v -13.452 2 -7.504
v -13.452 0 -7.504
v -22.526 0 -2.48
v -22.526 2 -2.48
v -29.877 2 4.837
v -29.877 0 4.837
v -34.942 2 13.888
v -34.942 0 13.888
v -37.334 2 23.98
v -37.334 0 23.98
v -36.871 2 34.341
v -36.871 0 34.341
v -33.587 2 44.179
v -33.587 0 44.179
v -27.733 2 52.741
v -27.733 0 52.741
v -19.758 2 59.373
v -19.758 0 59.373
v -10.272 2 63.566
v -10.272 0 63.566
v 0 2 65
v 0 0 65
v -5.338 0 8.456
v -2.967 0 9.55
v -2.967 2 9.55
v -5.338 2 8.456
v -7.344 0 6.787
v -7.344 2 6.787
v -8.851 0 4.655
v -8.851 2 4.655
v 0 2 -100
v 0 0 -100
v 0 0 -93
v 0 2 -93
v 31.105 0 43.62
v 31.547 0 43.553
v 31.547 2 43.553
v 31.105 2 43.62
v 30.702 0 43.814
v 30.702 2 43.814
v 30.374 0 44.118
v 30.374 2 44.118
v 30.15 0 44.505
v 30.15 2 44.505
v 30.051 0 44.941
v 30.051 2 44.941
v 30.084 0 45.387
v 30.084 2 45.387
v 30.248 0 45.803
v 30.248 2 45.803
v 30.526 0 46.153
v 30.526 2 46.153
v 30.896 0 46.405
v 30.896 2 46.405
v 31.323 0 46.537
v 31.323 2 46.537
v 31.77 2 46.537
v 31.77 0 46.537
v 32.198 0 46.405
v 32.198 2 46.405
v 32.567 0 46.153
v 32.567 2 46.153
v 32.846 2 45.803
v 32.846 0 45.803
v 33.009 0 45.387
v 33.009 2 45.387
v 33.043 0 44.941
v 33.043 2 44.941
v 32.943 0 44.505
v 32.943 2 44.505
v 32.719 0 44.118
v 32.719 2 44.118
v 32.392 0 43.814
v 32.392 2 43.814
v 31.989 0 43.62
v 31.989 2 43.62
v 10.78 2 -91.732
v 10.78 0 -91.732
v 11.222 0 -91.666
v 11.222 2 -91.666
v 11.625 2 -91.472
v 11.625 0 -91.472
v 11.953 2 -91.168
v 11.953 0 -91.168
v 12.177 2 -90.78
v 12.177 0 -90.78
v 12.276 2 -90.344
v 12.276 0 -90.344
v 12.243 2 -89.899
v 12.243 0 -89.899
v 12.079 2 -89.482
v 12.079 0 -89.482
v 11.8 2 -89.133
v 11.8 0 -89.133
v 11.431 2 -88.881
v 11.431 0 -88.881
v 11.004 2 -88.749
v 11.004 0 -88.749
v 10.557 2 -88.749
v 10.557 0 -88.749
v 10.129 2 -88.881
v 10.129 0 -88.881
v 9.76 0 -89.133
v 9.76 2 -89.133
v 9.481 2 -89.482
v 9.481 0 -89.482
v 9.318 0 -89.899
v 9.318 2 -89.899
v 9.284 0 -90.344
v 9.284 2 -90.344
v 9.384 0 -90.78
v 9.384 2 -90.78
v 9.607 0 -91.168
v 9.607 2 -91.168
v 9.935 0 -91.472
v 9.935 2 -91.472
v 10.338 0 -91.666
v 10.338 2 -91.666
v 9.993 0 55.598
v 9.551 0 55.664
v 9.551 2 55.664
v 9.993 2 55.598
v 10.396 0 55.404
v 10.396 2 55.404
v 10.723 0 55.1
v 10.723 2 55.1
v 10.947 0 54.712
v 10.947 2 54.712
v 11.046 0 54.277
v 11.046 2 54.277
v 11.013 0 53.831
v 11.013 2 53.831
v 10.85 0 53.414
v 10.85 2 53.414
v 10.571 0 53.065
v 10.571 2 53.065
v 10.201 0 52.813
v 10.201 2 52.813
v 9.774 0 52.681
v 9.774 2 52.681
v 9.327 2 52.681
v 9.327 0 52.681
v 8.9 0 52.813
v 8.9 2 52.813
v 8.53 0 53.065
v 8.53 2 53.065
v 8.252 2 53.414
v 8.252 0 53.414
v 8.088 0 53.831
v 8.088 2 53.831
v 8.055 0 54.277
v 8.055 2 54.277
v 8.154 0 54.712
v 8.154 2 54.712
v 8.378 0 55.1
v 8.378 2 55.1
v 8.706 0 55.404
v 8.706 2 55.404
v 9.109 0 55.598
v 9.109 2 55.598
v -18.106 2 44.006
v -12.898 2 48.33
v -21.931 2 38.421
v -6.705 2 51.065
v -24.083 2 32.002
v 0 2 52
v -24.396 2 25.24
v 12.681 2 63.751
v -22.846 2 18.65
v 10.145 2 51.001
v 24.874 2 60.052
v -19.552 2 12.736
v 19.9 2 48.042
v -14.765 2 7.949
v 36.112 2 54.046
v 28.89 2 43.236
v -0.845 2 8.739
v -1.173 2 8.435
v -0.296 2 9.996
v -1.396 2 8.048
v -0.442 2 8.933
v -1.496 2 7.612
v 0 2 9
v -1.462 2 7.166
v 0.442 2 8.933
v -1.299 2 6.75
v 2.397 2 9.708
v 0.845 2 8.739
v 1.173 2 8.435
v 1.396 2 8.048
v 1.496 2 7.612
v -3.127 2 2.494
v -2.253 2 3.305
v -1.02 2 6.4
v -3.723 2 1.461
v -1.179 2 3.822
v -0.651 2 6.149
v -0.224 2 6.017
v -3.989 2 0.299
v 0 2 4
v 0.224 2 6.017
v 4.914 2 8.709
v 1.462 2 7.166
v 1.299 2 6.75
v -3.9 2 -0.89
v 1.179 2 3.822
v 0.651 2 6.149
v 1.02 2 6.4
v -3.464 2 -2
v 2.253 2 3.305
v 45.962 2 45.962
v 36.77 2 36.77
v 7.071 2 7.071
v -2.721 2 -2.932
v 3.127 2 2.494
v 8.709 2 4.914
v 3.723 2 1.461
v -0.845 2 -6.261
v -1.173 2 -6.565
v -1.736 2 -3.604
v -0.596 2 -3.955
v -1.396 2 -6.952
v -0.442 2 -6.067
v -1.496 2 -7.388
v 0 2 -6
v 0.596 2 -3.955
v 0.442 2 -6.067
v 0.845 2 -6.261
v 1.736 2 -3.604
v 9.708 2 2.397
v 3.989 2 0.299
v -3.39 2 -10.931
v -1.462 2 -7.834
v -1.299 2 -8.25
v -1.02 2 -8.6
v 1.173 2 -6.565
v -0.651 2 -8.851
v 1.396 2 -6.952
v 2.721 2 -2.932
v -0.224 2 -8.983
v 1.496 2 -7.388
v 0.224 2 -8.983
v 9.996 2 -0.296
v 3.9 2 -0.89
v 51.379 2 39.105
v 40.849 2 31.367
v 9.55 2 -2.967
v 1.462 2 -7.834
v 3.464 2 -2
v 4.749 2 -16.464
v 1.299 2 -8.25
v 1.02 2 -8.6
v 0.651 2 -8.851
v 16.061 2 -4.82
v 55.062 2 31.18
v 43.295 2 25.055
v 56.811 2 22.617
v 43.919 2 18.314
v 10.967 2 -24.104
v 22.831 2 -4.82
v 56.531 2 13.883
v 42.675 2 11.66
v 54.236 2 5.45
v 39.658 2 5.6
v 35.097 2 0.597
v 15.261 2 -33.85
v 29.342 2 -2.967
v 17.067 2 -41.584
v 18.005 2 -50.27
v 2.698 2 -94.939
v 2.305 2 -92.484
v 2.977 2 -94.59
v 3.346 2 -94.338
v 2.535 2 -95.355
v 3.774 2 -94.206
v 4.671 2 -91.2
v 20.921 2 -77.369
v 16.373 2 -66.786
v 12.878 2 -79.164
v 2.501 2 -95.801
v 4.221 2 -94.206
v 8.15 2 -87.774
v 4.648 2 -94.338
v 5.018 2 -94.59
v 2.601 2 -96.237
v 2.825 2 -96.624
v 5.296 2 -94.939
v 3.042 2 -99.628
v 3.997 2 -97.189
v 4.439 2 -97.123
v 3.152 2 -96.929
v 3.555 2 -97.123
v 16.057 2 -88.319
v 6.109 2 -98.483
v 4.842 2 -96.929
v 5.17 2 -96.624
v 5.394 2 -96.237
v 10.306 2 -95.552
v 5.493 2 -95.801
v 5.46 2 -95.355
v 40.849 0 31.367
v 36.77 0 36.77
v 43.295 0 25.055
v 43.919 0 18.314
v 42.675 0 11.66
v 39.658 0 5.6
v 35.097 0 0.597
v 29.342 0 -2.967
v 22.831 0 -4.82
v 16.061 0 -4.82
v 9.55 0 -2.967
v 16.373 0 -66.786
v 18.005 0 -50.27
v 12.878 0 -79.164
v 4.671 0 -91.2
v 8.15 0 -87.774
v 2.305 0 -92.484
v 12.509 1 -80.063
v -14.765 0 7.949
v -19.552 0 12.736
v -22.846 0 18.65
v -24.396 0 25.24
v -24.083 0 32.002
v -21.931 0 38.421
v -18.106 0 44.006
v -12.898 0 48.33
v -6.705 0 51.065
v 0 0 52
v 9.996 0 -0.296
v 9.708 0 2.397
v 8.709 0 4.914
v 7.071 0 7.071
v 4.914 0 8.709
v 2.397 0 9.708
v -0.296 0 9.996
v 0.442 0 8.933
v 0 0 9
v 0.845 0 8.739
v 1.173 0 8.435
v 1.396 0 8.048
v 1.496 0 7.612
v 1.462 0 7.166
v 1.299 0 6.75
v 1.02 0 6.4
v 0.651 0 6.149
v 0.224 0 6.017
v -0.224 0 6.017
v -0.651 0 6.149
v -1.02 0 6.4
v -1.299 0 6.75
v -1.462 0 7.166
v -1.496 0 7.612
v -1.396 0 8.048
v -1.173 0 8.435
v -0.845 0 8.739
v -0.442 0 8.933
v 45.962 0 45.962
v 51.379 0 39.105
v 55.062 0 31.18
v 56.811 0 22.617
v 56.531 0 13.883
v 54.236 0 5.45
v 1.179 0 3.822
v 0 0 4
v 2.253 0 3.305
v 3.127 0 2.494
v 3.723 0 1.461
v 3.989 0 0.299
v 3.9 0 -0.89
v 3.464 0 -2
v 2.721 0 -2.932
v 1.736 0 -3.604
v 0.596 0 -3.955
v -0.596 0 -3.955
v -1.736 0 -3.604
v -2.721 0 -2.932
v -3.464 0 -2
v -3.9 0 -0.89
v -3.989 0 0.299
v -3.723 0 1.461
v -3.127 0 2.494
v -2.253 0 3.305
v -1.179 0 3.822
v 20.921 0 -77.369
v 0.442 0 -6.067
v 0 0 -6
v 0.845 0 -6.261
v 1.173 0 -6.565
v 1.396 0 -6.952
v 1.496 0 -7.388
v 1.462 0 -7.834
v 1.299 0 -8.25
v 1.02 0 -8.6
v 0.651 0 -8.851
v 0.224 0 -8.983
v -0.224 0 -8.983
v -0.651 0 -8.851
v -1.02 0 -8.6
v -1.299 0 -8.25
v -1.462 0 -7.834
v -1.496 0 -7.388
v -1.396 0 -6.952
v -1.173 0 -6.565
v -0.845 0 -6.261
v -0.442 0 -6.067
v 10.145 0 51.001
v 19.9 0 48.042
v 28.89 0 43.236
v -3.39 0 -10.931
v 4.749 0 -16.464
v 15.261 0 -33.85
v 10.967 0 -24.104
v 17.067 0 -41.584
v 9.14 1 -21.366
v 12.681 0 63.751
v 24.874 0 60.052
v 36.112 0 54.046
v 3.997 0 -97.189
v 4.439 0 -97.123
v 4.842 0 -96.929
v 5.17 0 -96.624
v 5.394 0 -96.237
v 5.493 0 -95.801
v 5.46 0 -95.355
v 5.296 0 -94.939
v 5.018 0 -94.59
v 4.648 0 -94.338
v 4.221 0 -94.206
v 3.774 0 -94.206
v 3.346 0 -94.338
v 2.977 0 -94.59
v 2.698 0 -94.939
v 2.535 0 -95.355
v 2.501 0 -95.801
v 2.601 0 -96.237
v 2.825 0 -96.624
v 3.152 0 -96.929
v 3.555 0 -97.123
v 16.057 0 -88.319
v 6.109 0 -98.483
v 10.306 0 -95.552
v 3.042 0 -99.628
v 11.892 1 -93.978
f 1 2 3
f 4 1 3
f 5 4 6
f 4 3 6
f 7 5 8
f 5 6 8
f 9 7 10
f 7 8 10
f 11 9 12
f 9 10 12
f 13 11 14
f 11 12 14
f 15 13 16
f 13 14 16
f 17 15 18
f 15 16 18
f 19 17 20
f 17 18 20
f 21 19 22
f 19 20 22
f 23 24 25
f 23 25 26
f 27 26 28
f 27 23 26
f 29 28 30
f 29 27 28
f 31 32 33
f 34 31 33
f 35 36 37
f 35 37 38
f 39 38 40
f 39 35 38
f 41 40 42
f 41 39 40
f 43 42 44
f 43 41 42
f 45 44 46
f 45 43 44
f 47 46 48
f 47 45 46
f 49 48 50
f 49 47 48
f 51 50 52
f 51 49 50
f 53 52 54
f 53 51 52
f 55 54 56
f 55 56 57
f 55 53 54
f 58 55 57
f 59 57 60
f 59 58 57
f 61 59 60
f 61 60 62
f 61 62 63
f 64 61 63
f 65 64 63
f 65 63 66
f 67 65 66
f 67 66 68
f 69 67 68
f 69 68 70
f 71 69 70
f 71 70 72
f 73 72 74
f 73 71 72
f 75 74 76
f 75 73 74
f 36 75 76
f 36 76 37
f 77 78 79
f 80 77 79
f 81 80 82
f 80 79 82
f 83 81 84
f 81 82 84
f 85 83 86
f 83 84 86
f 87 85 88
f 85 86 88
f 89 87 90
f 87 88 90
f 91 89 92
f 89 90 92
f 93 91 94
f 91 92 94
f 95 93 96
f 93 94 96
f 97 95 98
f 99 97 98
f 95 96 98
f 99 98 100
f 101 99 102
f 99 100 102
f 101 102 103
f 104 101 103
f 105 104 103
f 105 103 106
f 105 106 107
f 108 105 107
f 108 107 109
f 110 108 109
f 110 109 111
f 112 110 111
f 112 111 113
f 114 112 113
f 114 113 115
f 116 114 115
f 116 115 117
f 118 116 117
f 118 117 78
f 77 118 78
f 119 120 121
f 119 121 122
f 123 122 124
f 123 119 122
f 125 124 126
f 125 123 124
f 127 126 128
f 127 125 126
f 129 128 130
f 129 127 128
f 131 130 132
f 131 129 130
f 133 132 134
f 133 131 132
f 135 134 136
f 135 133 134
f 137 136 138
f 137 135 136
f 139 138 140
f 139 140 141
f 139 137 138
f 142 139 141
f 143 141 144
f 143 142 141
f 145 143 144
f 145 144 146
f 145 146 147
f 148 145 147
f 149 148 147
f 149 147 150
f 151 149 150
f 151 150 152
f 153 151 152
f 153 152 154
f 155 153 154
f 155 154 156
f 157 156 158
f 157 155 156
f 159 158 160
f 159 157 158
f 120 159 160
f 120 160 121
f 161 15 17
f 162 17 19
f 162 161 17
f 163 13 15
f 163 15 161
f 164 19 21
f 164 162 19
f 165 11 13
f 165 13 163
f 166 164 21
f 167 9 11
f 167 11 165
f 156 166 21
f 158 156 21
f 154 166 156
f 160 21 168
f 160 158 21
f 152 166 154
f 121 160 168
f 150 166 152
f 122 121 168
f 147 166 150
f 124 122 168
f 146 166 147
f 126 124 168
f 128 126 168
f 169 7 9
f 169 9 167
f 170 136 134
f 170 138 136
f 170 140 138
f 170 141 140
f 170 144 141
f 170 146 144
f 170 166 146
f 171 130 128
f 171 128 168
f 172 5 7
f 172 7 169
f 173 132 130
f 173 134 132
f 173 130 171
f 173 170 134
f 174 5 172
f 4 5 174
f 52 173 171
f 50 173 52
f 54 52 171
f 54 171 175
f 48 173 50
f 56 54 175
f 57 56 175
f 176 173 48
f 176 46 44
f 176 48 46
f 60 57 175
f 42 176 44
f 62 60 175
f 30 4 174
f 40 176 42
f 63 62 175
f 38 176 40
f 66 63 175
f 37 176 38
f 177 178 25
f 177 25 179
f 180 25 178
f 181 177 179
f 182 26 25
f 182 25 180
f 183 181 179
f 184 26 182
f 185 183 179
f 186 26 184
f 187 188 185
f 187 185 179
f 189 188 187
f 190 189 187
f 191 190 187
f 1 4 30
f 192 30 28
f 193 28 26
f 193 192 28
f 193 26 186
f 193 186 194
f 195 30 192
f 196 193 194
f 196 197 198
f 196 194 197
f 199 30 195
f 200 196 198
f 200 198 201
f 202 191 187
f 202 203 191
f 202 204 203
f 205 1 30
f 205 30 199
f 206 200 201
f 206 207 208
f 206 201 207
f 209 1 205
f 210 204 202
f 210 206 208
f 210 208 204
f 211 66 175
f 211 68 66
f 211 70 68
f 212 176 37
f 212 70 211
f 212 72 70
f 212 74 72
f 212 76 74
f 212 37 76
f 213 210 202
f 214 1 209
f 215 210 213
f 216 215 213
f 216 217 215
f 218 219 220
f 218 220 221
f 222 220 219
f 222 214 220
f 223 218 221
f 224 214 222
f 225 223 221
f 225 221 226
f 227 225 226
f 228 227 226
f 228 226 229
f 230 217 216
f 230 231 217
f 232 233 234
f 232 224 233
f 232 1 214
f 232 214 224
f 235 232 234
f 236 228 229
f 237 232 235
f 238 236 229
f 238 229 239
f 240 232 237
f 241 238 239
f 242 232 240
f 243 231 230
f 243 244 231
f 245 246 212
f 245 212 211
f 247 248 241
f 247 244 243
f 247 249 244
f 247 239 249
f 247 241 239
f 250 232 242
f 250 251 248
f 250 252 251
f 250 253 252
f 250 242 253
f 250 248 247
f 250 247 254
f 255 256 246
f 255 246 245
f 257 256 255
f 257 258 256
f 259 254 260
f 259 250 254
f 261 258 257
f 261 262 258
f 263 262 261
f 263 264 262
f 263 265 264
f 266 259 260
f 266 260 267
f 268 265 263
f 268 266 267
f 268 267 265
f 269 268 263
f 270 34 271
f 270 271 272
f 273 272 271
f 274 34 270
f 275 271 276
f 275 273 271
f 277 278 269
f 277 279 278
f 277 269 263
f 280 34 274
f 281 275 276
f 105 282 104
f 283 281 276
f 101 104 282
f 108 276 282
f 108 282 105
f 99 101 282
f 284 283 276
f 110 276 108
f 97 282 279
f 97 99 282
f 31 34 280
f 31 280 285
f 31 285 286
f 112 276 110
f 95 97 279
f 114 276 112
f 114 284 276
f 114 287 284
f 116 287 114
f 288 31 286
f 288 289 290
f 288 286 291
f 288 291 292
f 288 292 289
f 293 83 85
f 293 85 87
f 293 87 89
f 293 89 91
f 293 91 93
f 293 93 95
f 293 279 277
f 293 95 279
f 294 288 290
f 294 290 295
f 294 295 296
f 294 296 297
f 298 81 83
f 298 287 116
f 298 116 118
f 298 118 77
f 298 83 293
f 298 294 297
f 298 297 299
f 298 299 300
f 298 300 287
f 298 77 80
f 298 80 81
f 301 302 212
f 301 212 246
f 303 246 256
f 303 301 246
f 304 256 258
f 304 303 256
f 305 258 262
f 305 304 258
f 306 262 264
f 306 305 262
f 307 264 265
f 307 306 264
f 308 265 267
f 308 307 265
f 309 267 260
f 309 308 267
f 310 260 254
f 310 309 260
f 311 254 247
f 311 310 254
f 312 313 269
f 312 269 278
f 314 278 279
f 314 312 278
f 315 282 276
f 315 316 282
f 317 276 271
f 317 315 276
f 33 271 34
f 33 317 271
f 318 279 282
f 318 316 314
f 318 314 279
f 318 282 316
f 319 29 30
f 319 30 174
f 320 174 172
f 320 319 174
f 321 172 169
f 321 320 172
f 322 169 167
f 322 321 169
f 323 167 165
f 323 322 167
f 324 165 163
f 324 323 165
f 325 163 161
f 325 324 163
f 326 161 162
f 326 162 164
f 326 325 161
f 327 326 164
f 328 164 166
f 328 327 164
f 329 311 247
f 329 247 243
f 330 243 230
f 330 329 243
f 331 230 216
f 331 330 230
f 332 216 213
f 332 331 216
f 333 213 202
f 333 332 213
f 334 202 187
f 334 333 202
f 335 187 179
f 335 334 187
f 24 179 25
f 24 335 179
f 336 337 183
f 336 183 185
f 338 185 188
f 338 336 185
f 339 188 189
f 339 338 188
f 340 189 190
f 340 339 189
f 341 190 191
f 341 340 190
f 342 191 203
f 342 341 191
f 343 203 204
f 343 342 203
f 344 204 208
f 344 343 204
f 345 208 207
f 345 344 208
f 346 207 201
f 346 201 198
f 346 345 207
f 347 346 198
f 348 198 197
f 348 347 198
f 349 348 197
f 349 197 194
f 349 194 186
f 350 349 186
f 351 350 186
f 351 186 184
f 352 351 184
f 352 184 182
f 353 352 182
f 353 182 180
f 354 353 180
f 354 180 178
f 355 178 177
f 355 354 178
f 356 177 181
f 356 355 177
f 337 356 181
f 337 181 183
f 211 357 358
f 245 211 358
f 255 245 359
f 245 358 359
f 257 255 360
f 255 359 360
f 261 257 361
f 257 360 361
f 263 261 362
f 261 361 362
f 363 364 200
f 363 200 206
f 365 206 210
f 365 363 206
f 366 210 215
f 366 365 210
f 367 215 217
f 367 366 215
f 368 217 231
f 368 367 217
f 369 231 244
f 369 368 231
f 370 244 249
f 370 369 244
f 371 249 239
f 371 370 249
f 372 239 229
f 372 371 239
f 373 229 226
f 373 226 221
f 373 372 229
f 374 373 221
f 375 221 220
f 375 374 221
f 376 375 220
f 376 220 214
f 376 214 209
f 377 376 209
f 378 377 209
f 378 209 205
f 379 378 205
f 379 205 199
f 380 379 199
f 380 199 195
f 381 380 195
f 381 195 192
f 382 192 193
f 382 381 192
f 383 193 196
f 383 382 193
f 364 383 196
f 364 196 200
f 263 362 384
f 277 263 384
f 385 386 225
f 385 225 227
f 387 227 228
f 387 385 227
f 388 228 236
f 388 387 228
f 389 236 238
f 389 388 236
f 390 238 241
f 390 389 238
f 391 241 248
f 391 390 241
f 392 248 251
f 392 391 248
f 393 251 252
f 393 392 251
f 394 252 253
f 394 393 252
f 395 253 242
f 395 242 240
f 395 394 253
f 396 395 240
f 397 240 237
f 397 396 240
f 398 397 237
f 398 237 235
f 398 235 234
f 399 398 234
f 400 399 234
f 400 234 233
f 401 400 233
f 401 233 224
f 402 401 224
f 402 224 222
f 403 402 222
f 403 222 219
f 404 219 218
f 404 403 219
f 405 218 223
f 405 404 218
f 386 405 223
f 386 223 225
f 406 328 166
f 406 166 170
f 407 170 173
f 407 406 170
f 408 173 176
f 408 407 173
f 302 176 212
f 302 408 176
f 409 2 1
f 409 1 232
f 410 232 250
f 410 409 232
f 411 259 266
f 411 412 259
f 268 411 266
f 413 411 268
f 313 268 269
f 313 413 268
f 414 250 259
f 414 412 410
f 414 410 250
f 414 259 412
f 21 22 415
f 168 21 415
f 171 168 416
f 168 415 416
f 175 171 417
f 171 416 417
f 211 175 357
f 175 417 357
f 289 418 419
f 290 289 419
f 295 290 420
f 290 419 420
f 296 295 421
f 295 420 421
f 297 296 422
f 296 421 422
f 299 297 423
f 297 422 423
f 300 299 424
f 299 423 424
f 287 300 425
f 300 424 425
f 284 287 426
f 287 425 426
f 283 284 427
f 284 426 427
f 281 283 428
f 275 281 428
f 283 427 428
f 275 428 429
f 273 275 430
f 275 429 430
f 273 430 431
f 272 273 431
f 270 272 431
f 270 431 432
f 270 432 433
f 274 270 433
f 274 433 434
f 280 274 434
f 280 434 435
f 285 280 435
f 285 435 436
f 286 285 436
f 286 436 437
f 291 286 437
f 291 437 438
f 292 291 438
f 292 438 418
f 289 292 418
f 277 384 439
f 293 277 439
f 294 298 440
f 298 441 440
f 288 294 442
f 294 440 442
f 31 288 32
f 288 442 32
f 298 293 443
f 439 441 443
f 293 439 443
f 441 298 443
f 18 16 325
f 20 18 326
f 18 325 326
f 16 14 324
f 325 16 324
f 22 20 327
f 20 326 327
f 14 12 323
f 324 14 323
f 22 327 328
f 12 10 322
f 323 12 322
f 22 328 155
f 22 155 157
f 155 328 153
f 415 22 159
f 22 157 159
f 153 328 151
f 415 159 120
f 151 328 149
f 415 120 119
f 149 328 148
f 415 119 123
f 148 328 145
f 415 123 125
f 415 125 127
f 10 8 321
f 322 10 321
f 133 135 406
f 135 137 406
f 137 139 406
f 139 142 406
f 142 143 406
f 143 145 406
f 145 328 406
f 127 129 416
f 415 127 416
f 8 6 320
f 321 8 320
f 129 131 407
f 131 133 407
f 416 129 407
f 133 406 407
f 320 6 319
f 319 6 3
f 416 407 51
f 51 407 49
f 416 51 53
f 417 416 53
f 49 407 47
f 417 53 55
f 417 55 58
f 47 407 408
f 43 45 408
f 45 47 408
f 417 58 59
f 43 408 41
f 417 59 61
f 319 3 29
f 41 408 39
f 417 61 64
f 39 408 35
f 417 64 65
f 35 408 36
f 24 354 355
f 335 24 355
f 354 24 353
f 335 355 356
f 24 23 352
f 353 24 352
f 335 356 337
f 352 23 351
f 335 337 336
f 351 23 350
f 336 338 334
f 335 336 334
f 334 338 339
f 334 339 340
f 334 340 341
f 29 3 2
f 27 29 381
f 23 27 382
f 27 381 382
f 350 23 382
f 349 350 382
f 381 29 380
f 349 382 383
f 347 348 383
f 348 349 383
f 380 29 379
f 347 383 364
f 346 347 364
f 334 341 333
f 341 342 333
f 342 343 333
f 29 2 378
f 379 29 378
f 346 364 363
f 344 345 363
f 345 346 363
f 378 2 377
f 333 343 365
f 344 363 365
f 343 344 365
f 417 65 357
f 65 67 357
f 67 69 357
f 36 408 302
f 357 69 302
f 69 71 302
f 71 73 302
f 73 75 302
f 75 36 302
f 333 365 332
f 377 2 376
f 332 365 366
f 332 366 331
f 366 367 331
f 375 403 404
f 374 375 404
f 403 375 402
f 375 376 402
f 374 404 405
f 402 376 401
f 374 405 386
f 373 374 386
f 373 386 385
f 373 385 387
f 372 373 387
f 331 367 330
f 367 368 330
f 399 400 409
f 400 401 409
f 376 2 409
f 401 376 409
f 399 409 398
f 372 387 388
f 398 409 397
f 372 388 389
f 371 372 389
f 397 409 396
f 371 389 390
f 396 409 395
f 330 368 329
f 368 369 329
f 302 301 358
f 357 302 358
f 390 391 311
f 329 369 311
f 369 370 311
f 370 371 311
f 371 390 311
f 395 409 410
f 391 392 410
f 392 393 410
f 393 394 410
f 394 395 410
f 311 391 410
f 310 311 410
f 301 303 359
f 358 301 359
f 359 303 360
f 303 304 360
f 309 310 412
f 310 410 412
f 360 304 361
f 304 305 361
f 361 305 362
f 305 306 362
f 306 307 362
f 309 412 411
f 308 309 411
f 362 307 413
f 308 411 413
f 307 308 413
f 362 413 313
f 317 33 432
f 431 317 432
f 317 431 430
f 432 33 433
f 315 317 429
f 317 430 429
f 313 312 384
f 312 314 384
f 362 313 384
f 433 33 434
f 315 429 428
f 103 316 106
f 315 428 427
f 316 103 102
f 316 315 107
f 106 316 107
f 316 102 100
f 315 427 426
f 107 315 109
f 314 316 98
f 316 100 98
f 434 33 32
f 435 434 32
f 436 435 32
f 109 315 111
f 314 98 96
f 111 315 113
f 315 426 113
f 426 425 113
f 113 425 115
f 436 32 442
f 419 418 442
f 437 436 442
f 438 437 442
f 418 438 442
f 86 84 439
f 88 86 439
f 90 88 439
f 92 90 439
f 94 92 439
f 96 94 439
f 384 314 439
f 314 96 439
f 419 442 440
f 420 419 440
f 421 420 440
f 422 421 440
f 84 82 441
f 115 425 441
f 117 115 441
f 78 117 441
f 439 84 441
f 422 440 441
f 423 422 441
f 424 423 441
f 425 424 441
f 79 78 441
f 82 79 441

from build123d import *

# Parameters (mm, degrees)
SKETCH_1_R          = 1.5
SKETCH_1_R_2        = 4
EXTRUDE_1_DEPTH     = 2
SKETCH_2_R          = 1.5
CUT_EXTRUDE_1_DEPTH = 116.094668721


with BuildPart() as part:
    # Эскиз1 → Бобышка-Вытянуть1 (new body)
    with BuildSketch(Plane(origin=(0, 0, 0), x_dir=(1, 0, 0), z_dir=(0, 1, 0))):
        with BuildLine():
            Line((54.236033393, -5.45028137), (20.920510558, 77.368874006))
            add(Edge.make_bspline(
                [(20.920510558, 77.368874006), (13.519104954, 99.996768719), (0, 100)],
                knots=[2.149983836, 2.149983836, 2.149983836, 3.14143331, 3.14143331, 3.14143331], degree=2, weights=[1, 0.879624206, 1]))
            Line((0, 100), (0, 93))
            add(Edge.make_bspline(
                [(18.005142203, 50.270253613), (17.382191681, 91.773168681), (0, 93)],
                knots=[1.570796327, 1.570796327, 1.570796327, 3.105746544, 3.105746544, 3.105746544], degree=2, weights=[1, 0.719666045, 1]))
            add(Edge.make_bspline(
                [(-13.452394346, 7.504043857), (16.003264405, 13.845732338), (18.005142203, 50.270253613)],
                knots=[0, 0, 0, 1, 1, 1], degree=2))
            ThreePointArc((-13.452394346, 7.504043857), (-36.870731242, -34.340992448), (0, -65))
            ThreePointArc((0, -65), (24.874423104, -60.052169613), (45.961940777, -45.961940777))
            ThreePointArc((45.961940777, -45.961940777), (56.186949809, -26.949515273), (54.236033393, -5.45028137))
        make_face()
        with Locations(Location((9.550649772, -54.164426416, 0), (0, 0, 270))):
            Circle(SKETCH_1_R, mode=Mode.SUBTRACT)
        with Locations(Location((31.546703999, -45.053362436, 0), (0, 0, 90))):
            Circle(SKETCH_1_R, mode=Mode.SUBTRACT)
        with Locations(Location((0, 0, 0), (0, 0, 270))):
            Circle(SKETCH_1_R_2, mode=Mode.SUBTRACT)
        with Locations(Location((0, -7.5, 0), (0, 0, 270))):
            Circle(SKETCH_1_R, mode=Mode.SUBTRACT)
        with Locations(Location((0, 7.5, 0), (0, 0, 270))):
            Circle(SKETCH_1_R, mode=Mode.SUBTRACT)
        with BuildLine():
            ThreePointArc((0, -52), (19.899538483, -48.041735691), (36.769552622, -36.769552622))
            ThreePointArc((36.769552622, -36.769552622), (39.657964622, -5.59972573), (9.54966327, 2.967141962))
            ThreePointArc((9.54966327, 2.967141962), (7.071067812, -7.071067812), (-2.967141962, -9.54966327))
            ThreePointArc((-2.967141962, -9.54966327), (-6.395779647, -7.687262368), (-8.850717859, -4.654545455))
            ThreePointArc((-8.850717859, -4.654545455), (-24.082811675, -32.002019749), (0, -52))
        make_face(mode=Mode.SUBTRACT)
    extrude(amount=EXTRUDE_1_DEPTH)

    # Эскиз2 → Вырез-Вытянуть1 (cut, through all)
    with BuildSketch(Plane.XZ):
        with Locations(Location((3.997292475, -95.689262056, 0), (0, 0, 270))):
            Circle(SKETCH_2_R)
        with Locations(Location((10.780229305, -90.232363482, 0), (0, 0, 270))):
            Circle(SKETCH_2_R)
    extrude(amount=-CUT_EXTRUDE_1_DEPTH, mode=Mode.SUBTRACT)


solid = part.part
